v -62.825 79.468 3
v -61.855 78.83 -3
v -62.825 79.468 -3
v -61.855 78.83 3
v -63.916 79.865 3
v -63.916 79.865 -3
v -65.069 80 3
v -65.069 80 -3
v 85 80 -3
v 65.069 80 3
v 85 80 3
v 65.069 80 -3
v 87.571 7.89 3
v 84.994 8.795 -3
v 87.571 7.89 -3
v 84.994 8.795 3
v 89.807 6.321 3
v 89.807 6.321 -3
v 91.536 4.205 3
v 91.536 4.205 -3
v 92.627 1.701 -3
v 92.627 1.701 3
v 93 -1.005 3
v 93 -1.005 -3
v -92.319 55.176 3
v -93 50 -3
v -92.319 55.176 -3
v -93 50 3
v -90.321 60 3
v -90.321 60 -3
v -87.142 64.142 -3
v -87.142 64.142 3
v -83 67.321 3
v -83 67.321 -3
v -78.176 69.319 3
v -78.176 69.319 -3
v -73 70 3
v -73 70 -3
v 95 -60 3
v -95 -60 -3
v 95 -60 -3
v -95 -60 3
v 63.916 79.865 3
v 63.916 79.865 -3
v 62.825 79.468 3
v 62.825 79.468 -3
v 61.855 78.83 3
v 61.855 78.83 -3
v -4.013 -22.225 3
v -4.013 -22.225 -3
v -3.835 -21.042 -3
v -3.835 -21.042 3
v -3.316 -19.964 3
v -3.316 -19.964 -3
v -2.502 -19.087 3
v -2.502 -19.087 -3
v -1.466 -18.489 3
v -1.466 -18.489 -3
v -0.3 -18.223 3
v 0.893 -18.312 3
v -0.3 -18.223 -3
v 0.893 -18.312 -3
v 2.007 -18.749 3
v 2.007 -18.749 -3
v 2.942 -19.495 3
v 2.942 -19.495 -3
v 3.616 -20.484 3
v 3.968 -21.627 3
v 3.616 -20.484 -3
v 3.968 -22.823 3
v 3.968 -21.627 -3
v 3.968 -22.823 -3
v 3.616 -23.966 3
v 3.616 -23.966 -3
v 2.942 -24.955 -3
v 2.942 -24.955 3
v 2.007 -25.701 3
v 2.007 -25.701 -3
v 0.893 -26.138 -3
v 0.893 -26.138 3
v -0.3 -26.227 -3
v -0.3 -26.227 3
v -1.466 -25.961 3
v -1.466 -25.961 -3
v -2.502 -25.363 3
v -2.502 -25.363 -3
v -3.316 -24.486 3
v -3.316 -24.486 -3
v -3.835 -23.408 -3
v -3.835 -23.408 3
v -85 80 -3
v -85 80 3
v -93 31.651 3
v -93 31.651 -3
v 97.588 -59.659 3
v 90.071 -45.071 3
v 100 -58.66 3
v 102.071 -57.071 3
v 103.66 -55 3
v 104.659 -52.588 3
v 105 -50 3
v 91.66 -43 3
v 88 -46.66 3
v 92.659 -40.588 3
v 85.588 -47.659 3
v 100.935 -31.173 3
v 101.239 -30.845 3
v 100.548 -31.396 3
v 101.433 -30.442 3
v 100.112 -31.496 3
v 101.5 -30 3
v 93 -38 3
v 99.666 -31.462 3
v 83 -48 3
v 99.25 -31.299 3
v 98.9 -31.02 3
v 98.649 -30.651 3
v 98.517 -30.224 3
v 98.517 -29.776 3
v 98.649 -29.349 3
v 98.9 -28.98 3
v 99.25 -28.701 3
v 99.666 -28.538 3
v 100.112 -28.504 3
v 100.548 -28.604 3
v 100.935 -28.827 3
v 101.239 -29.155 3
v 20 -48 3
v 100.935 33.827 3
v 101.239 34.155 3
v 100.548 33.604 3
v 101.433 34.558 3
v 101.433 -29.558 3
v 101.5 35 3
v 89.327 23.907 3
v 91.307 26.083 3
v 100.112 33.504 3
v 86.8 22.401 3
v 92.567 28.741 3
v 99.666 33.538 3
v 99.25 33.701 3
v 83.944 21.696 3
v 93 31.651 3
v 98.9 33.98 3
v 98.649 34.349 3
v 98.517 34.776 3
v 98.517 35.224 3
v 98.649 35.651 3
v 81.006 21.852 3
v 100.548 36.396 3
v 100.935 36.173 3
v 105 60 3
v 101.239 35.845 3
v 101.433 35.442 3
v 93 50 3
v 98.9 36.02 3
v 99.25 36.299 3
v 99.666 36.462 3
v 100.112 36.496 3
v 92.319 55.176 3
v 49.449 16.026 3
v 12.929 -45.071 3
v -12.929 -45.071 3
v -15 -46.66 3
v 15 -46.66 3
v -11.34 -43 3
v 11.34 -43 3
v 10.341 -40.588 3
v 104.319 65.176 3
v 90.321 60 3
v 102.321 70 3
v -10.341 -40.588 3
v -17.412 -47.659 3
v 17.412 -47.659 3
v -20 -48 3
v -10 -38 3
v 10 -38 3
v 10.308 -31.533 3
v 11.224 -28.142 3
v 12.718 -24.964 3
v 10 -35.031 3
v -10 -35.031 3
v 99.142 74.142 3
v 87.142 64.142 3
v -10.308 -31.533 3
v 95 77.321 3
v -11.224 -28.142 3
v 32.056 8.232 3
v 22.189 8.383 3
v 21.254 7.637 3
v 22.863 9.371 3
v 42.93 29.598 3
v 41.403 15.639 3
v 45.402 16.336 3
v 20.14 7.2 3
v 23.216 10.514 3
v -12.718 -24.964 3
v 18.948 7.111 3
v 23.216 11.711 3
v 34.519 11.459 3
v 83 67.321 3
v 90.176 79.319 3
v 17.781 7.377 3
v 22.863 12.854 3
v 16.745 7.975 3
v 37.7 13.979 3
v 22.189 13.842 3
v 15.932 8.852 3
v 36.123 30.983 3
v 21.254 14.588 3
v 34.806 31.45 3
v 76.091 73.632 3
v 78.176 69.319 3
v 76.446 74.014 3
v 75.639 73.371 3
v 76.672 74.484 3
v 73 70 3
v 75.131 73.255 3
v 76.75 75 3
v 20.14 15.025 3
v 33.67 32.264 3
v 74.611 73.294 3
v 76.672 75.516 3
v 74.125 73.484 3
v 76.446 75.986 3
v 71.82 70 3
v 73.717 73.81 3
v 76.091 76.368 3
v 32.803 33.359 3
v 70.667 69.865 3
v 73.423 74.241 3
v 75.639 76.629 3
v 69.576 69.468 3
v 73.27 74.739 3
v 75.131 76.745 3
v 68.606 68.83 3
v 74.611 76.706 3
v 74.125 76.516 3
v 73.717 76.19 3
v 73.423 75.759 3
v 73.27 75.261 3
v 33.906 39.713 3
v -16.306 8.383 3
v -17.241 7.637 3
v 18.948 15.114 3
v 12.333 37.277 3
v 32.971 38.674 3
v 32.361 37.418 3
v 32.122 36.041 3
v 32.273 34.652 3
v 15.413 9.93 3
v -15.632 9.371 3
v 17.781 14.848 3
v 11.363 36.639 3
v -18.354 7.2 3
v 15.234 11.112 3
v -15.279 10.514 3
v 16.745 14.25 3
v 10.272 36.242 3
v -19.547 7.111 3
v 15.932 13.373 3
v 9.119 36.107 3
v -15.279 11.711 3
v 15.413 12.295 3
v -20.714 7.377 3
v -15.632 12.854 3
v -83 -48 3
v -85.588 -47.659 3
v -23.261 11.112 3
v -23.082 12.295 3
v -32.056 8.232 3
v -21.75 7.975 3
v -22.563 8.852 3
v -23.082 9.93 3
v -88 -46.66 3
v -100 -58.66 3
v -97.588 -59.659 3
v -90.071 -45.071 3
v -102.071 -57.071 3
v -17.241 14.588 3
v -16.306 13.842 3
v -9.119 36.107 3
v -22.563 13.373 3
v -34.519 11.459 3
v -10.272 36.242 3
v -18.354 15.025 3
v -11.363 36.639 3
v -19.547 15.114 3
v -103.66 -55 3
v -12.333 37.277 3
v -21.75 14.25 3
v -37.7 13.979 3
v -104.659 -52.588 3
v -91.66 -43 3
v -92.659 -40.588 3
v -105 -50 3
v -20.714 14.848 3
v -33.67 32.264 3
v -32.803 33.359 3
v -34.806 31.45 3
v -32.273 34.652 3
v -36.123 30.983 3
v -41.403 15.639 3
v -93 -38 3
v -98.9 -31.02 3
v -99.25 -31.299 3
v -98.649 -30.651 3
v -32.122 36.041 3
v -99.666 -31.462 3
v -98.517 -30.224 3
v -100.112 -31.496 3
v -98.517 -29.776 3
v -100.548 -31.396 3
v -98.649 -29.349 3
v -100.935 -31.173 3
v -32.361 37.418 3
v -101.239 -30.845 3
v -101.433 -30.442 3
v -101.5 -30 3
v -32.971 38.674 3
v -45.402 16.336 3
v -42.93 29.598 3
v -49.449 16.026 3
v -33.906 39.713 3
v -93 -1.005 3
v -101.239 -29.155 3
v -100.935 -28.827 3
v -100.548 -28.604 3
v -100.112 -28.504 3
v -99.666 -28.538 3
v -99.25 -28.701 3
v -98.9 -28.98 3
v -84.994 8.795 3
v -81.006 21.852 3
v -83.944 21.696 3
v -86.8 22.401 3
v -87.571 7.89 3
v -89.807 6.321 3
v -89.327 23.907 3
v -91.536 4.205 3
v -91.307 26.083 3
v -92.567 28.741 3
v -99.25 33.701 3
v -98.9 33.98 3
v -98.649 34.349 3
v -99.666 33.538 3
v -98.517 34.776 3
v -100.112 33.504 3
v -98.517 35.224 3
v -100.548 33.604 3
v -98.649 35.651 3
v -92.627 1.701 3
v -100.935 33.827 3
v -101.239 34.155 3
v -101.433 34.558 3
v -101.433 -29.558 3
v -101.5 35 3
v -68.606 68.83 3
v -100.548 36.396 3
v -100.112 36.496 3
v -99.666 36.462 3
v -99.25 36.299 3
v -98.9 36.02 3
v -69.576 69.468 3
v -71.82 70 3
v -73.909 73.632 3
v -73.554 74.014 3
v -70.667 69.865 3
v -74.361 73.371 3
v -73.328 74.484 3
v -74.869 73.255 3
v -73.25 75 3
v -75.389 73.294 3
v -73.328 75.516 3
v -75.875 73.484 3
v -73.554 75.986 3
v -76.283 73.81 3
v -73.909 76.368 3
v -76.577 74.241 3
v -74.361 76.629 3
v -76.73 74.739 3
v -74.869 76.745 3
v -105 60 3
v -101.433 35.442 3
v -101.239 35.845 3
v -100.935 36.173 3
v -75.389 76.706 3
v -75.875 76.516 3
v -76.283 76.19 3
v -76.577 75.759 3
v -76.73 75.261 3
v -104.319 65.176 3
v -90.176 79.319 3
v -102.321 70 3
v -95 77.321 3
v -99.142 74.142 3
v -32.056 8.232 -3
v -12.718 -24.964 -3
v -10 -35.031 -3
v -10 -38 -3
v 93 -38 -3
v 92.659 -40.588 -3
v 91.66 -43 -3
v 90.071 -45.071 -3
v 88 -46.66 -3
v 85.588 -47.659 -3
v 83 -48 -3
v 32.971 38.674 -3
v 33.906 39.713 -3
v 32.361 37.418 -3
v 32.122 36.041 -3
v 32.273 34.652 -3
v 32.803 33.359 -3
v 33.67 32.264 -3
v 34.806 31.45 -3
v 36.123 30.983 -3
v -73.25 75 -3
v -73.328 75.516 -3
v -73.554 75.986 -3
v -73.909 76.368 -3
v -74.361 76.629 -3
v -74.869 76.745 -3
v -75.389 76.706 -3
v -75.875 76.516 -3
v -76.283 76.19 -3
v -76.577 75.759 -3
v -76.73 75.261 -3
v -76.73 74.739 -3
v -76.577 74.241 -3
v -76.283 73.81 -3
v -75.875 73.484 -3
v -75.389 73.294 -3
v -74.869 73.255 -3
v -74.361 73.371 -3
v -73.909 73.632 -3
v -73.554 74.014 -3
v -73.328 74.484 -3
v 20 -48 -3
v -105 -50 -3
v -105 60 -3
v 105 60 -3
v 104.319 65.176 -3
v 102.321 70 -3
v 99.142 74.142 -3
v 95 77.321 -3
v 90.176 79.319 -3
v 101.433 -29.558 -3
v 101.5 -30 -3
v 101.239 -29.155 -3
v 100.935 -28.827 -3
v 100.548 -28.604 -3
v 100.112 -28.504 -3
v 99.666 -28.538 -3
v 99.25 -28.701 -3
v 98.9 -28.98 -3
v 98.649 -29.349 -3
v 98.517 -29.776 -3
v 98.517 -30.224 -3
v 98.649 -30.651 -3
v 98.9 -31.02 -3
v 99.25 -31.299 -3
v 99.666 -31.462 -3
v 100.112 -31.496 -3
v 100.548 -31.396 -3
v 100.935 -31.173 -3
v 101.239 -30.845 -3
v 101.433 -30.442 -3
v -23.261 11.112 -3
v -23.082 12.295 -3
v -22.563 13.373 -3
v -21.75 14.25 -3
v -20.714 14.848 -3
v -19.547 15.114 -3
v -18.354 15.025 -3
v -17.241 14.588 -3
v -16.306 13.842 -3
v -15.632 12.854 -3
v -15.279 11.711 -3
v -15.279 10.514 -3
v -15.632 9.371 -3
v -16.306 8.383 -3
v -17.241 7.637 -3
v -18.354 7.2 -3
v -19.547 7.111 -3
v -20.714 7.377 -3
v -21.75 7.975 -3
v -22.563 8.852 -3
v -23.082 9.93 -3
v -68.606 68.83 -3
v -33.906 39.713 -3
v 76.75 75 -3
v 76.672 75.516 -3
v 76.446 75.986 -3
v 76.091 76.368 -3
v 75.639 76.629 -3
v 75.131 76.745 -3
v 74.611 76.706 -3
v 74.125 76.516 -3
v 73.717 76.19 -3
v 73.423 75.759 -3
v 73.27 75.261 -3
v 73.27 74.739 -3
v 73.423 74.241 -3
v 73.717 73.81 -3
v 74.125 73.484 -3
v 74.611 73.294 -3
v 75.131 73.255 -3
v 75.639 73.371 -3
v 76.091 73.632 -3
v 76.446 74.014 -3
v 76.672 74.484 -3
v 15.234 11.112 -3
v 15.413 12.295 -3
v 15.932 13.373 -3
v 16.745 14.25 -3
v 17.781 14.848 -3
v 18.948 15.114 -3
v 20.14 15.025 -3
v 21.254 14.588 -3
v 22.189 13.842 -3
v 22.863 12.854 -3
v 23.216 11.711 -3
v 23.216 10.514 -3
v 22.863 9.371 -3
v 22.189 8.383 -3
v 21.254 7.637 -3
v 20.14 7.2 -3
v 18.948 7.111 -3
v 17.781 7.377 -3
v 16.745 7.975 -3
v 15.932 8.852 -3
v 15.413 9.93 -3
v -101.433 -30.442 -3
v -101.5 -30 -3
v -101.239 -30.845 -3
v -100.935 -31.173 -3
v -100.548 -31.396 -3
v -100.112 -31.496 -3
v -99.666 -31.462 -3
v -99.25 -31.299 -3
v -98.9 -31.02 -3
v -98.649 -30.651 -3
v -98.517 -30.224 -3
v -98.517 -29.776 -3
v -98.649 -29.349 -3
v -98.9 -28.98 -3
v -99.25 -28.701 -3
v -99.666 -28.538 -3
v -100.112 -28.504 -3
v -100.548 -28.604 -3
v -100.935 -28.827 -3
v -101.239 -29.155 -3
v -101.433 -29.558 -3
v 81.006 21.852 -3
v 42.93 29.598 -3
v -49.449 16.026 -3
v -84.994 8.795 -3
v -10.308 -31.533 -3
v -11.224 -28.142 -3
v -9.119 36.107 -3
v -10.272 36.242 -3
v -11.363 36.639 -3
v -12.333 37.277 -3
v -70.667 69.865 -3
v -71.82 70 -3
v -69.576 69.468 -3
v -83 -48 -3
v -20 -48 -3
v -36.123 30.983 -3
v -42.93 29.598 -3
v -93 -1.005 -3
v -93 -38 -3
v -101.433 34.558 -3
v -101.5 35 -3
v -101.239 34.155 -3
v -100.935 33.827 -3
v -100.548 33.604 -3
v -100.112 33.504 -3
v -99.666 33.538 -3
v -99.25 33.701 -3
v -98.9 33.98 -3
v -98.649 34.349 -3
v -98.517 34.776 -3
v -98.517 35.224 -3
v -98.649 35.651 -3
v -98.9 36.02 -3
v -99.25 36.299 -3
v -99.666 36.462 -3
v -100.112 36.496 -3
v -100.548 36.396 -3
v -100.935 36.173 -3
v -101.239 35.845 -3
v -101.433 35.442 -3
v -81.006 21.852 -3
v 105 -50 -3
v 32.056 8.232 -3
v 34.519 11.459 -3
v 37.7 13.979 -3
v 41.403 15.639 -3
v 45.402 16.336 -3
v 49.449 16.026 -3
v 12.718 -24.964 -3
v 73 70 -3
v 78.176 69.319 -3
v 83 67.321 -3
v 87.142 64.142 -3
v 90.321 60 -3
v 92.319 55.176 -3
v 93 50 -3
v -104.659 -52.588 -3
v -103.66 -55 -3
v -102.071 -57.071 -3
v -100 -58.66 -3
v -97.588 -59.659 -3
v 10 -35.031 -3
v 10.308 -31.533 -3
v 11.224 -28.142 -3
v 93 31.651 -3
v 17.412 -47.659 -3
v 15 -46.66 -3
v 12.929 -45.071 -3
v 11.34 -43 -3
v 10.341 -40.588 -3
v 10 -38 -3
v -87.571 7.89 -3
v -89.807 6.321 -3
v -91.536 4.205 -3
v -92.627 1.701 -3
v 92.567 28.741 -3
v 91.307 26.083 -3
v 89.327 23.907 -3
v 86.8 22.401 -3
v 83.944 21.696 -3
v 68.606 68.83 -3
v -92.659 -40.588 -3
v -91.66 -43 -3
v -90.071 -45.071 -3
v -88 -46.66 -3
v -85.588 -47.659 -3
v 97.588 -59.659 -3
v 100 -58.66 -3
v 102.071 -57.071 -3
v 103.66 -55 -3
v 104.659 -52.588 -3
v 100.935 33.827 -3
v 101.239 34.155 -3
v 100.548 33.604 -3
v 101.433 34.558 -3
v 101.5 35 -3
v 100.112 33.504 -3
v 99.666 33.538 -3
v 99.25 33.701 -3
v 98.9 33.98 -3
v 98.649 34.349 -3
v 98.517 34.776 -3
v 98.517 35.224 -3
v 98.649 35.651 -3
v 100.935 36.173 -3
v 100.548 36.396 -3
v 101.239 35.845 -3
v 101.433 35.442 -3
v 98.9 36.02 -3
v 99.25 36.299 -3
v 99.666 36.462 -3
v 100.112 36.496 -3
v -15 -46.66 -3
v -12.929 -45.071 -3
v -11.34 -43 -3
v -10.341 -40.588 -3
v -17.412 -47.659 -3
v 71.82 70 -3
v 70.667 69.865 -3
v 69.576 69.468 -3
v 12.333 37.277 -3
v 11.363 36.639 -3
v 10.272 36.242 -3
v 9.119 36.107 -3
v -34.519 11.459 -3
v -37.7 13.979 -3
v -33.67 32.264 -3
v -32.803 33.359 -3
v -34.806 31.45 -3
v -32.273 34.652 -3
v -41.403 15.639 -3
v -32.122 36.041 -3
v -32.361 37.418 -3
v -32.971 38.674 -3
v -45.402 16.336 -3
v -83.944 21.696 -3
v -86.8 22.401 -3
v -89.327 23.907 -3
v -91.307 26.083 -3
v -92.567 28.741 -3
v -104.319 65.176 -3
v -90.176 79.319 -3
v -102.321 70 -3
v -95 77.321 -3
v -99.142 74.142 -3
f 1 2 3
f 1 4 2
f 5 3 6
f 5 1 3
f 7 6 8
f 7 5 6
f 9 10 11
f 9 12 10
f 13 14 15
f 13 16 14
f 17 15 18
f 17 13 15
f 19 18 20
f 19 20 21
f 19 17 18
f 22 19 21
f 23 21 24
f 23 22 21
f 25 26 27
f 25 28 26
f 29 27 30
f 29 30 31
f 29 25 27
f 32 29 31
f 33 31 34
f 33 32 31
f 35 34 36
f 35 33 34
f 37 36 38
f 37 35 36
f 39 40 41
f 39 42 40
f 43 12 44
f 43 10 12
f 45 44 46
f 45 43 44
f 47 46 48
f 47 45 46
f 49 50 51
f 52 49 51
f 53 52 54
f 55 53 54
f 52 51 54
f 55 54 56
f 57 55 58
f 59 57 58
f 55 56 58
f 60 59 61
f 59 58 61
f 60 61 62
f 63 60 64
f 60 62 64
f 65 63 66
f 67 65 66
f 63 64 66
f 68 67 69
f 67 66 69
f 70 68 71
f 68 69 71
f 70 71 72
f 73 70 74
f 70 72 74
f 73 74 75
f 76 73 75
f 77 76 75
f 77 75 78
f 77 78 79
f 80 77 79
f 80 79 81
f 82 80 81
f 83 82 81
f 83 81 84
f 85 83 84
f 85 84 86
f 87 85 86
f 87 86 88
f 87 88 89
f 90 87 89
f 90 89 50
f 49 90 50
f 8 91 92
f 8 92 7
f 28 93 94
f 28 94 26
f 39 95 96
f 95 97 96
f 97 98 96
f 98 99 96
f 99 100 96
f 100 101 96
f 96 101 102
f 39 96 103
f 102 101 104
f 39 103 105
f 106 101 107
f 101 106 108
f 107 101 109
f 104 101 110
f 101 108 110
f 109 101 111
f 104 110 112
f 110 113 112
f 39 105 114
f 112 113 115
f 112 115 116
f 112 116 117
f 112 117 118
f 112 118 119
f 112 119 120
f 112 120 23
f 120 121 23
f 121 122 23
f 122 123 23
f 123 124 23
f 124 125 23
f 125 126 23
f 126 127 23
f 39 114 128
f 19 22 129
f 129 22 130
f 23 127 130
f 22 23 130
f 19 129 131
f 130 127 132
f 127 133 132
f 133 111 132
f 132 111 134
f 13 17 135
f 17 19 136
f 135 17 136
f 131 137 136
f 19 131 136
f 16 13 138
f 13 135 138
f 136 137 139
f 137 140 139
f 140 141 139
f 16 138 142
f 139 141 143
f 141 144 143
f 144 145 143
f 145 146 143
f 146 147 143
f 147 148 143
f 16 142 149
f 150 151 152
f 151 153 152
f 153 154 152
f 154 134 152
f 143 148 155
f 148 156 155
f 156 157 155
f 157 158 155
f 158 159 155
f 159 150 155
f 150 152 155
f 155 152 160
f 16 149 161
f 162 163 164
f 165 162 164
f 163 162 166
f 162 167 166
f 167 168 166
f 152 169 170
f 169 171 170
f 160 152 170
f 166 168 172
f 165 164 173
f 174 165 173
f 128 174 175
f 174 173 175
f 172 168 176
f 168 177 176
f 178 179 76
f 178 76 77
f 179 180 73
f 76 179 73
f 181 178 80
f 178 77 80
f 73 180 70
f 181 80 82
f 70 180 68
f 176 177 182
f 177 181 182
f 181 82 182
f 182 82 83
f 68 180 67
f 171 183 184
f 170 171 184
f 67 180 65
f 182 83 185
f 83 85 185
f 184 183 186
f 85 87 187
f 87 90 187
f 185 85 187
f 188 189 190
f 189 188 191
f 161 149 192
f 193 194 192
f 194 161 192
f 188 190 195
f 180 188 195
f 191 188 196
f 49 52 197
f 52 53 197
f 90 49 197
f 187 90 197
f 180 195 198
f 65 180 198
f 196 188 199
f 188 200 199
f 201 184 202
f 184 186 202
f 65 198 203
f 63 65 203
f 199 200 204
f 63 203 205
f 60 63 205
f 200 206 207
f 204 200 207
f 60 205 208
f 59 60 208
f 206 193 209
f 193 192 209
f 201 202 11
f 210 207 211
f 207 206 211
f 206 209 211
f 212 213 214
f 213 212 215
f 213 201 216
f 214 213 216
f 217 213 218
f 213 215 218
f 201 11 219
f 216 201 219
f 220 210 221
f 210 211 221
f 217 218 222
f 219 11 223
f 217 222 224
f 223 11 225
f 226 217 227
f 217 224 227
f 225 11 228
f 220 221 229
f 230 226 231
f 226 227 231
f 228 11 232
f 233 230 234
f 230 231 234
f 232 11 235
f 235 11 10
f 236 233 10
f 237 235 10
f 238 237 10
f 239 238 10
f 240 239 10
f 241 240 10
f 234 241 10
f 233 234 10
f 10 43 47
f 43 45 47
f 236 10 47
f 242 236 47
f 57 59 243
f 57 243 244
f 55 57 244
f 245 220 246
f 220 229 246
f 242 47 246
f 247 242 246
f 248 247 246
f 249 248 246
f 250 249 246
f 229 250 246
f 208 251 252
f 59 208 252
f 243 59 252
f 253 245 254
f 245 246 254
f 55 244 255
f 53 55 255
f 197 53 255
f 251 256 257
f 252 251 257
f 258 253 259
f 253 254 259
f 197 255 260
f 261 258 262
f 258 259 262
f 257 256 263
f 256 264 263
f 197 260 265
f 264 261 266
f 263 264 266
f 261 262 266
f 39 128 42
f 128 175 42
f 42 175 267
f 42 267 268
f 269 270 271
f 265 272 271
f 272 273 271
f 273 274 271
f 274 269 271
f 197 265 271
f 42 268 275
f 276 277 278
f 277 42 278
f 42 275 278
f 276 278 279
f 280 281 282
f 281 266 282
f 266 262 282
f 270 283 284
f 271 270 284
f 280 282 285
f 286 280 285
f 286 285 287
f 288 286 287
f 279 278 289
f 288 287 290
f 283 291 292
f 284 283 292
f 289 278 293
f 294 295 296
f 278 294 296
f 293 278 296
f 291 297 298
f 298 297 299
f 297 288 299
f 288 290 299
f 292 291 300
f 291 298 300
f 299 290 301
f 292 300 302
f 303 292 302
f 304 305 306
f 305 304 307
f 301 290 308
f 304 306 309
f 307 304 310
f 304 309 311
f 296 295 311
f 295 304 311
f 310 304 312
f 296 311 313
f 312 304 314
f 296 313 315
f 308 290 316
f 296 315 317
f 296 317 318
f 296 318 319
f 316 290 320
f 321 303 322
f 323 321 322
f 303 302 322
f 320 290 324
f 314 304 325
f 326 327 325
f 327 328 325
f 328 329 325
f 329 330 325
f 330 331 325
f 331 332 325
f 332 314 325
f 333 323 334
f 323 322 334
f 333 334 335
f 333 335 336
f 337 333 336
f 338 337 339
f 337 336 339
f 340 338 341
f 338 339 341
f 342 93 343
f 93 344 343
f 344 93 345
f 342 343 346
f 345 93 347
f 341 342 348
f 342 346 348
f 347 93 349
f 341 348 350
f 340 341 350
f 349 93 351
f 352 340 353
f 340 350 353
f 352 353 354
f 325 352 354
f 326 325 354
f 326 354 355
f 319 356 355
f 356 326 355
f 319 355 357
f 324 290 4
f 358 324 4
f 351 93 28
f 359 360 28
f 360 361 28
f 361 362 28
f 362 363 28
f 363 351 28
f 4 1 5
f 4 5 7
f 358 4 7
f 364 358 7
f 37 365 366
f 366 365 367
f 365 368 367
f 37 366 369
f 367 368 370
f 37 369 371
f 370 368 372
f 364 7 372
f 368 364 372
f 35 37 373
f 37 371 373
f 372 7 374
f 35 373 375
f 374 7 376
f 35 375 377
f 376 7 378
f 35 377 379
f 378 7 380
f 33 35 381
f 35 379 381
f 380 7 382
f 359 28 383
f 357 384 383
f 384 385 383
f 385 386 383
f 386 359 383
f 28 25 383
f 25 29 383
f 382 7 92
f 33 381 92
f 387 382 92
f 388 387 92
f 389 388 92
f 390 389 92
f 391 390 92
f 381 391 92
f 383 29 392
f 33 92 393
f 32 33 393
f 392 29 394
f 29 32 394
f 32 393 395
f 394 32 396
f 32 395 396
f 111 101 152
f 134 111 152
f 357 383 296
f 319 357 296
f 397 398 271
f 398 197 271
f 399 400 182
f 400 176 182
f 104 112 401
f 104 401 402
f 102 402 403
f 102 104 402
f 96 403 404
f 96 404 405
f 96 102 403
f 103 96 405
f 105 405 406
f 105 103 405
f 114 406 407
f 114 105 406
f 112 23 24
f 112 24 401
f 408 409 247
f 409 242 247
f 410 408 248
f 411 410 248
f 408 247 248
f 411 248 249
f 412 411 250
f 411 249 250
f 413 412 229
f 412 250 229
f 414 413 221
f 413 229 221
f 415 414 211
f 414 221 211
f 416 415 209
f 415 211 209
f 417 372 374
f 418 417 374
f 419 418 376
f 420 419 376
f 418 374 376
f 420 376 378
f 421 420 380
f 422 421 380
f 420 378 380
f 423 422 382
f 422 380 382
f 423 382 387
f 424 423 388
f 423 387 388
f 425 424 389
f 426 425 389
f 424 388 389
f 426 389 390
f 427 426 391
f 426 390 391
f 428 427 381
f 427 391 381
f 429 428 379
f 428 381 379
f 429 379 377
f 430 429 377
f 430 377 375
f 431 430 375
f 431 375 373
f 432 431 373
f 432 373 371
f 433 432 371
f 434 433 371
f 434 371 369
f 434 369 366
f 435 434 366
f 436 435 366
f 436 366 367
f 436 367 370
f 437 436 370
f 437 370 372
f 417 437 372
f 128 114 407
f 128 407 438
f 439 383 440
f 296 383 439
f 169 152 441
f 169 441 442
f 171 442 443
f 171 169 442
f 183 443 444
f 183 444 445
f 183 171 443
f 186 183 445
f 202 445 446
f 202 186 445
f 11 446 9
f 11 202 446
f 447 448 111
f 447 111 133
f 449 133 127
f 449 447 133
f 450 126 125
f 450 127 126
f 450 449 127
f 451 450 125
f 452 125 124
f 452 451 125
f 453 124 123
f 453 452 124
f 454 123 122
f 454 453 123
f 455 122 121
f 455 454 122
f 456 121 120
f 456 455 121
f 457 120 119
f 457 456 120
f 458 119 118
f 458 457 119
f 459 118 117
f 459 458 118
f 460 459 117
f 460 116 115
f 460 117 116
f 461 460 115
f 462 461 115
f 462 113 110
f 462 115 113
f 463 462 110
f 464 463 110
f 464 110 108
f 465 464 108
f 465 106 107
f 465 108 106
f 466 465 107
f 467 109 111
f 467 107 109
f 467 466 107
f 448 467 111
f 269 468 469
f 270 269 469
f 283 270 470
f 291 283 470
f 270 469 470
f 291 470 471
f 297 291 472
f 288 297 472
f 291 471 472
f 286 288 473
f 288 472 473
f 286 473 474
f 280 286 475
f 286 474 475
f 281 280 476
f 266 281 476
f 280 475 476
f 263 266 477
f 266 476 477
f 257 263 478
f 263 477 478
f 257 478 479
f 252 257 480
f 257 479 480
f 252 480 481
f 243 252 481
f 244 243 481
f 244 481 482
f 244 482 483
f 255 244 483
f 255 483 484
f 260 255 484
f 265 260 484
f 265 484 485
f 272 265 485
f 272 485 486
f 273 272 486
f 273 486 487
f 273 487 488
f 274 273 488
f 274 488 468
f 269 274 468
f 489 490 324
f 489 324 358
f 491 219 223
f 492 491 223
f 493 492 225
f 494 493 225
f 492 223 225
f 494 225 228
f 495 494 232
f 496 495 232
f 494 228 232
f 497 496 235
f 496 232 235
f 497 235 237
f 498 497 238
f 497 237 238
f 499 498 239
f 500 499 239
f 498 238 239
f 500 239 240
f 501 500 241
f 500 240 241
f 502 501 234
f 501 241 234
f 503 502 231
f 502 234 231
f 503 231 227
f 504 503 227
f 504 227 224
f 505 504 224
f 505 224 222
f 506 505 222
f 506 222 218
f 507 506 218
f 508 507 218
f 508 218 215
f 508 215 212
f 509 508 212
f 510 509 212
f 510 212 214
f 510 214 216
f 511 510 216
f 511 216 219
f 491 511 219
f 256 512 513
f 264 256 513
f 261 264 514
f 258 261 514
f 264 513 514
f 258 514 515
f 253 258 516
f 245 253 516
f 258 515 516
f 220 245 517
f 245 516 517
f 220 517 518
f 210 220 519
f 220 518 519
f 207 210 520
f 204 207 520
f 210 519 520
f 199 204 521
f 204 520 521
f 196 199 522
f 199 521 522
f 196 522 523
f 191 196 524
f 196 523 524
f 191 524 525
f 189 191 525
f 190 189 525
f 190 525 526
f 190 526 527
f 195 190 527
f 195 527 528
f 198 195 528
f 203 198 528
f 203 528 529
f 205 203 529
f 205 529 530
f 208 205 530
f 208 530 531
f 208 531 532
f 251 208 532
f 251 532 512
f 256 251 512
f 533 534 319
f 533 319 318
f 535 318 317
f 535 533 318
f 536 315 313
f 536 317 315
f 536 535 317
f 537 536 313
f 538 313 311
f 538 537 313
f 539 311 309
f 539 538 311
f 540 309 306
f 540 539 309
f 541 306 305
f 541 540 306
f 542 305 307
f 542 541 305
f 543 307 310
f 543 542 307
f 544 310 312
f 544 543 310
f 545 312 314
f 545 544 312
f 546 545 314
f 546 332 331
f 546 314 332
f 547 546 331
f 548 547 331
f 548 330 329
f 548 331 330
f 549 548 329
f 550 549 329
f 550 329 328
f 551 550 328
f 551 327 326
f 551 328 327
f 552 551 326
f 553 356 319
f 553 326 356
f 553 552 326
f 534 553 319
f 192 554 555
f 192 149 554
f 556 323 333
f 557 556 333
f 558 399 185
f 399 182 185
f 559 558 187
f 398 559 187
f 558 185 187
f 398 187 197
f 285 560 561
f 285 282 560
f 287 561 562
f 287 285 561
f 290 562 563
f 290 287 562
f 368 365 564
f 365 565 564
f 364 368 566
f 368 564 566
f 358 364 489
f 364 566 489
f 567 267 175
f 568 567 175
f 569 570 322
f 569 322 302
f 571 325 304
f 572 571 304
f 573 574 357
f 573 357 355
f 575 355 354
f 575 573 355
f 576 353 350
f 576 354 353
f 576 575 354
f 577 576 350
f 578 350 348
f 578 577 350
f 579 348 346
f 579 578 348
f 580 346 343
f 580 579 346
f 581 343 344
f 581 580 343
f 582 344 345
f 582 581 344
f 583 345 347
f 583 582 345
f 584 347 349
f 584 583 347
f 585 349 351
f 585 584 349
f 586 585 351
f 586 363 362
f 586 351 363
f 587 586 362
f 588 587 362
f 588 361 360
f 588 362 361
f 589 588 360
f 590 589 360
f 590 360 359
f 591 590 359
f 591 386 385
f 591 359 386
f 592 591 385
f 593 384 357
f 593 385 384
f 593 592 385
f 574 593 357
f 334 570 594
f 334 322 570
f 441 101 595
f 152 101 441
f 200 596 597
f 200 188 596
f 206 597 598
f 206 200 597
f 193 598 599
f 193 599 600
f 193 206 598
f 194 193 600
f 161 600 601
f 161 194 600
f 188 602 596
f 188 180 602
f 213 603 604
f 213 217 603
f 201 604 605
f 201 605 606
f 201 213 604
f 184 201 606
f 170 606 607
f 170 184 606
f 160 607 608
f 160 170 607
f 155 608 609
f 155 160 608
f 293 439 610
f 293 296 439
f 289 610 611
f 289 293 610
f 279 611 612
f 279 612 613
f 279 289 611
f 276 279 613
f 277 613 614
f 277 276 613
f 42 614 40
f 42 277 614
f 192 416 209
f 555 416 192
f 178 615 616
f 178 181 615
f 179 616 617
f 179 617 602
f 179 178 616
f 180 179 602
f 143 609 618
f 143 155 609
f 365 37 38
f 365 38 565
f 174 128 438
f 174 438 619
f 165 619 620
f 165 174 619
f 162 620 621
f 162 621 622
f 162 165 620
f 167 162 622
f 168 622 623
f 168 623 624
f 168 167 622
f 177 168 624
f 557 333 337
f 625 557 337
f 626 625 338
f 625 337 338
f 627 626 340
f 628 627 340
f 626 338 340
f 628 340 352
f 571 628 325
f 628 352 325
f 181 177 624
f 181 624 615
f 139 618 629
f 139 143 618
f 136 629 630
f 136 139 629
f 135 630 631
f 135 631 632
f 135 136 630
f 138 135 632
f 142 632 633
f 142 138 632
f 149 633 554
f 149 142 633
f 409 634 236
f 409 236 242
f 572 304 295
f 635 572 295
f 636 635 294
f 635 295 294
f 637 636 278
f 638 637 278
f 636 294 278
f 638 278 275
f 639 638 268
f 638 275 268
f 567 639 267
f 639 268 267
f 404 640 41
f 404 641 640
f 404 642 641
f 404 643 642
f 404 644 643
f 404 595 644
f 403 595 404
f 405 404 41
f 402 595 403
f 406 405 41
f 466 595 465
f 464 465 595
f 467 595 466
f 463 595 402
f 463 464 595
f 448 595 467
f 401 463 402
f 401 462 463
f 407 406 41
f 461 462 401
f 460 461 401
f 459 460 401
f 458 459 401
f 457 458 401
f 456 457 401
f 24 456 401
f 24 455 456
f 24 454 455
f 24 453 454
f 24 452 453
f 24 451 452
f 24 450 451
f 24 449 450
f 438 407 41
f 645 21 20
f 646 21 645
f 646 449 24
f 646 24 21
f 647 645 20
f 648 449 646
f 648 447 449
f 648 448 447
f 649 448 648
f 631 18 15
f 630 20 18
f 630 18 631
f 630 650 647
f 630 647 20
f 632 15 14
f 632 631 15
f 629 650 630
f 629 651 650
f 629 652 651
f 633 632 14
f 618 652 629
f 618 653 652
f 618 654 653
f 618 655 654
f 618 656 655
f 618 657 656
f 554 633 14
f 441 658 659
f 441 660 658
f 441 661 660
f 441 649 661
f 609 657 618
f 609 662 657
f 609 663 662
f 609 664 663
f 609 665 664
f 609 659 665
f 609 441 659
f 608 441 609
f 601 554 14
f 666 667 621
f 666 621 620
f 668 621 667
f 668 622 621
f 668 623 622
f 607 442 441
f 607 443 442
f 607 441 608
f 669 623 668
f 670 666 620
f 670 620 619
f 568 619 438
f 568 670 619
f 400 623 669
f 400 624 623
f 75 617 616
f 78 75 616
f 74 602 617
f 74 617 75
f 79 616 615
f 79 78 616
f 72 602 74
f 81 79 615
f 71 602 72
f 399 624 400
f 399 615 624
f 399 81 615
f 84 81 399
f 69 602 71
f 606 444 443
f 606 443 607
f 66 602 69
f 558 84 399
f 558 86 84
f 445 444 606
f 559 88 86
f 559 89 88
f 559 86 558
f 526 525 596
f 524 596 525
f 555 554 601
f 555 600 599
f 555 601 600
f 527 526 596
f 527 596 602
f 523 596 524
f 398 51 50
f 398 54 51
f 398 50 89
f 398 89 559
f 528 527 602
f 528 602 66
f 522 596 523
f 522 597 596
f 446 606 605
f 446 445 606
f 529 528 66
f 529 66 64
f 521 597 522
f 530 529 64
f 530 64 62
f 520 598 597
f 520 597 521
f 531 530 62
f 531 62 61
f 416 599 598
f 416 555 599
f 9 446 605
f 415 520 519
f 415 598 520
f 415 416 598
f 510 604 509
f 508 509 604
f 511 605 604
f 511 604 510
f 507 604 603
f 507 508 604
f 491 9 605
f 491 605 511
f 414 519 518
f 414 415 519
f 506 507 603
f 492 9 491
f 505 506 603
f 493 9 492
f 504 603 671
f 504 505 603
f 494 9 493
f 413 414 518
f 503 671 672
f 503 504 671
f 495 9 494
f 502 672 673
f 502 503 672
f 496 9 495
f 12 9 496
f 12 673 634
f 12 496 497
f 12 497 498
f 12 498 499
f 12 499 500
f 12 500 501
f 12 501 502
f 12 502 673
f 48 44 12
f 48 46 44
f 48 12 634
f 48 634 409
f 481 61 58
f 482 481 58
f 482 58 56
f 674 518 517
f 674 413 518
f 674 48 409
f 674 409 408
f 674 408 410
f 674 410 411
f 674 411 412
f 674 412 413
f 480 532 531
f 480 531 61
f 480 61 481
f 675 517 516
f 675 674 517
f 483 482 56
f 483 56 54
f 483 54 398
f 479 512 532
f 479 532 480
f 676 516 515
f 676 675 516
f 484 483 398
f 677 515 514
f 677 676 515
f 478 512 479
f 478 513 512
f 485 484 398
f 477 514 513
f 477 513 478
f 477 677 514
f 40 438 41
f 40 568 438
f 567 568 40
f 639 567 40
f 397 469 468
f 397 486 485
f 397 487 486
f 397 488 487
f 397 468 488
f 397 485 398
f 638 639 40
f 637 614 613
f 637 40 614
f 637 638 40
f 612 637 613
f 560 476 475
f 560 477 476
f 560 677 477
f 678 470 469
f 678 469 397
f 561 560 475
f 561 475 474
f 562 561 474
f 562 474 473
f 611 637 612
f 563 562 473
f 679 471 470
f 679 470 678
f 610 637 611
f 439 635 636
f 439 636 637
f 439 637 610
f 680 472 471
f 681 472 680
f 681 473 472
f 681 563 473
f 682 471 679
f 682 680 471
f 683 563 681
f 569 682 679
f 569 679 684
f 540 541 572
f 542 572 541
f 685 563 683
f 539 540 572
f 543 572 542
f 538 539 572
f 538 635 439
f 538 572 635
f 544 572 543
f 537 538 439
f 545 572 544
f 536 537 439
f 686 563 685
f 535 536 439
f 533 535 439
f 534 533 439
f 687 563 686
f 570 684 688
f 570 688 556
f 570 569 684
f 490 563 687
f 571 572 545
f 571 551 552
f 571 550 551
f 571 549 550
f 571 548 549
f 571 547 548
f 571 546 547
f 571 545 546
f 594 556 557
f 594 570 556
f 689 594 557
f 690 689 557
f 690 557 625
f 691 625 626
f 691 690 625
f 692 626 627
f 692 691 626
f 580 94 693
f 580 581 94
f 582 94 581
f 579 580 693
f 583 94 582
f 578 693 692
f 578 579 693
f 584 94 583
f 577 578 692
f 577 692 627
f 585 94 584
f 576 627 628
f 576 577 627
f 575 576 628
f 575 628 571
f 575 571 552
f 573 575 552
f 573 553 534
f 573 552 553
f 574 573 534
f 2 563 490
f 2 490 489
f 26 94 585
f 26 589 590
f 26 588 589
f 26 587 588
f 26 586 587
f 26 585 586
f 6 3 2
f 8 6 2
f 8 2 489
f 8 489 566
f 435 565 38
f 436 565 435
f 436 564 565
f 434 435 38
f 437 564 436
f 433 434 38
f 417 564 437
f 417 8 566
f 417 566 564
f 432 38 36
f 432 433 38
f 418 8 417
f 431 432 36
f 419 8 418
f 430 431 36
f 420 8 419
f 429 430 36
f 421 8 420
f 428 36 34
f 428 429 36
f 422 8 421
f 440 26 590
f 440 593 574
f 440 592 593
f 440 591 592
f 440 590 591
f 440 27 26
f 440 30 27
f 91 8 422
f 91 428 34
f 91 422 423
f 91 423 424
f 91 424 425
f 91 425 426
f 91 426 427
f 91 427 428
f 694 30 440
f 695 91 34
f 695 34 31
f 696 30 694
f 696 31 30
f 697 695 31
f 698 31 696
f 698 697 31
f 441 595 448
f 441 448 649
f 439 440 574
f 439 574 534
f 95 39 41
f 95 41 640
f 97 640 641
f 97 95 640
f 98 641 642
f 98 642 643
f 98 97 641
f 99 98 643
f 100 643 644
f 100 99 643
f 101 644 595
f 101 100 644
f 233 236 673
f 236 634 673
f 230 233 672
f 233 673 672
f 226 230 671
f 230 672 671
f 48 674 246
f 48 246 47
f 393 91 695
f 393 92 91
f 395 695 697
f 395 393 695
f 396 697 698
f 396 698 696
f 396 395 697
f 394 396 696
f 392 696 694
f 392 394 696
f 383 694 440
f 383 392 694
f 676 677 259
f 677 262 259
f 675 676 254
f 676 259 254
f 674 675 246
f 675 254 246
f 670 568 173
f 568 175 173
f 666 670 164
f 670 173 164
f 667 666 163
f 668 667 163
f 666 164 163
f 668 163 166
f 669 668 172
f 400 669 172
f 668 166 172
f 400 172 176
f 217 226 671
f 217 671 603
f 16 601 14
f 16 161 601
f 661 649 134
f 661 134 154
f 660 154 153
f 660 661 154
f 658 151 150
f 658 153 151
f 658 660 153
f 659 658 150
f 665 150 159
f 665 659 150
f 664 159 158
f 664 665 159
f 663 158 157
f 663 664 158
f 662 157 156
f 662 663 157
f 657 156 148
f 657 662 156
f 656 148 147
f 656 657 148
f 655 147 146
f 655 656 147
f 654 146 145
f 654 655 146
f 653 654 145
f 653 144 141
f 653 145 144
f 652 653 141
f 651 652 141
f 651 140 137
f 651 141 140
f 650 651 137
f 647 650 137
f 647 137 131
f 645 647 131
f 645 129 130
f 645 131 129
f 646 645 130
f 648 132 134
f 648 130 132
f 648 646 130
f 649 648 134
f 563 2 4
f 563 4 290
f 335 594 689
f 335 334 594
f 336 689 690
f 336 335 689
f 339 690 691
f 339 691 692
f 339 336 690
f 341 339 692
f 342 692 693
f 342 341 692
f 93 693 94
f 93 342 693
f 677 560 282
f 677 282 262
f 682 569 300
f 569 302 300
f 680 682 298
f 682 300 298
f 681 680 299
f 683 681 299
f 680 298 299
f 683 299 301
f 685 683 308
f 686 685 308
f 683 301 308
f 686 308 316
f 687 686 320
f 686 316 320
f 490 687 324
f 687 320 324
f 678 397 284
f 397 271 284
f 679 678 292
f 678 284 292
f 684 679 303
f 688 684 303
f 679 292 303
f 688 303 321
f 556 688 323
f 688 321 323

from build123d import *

# Parameters (mm, degrees)
BOSS_EXTRUDE1_DEPTH          = 3
CUT_EXTRUDE1_DEPTH           = 133.140077191
CUT_EXTRUDE1_DEPTH_BACK      = 133.140077191
SKETCH2_R                    = 1.5
O_0_316_DIAMETER_HOLE1_D     = 8.0264
O_0_316_DIAMETER_HOLE1_DEPTH = 10
O_0_316_DIAMETER_HOLE1_TIP   = 2.411373836
SKETCH6_W                    = 140
SKETCH6_H                    = 10
CUT_EXTRUDE2_DEPTH           = 10
SKETCH7_R                    = 1.75
CUT_EXTRUDE3_DEPTH           = 10
BOSS_EXTRUDE3_DEPTH          = 6
FILLET2_R                    = 5


with BuildPart() as part:
    # Sketch1 → Boss-Extrude1 (new, symmetric)
    with BuildSketch(Plane.XY):
        with BuildLine():
            Line((-95, -60), (95, -60))
            ThreePointArc((95, -60), (102.071067812, -57.071067812), (105, -50))
            Line((105, -50), (105, 60))
            ThreePointArc((105, 60), (99.142135624, 74.142135624), (85, 80))
            Line((85, 80), (-85, 80))
            ThreePointArc((-85, 80), (-99.142135624, 74.142135624), (-105, 60))
            Line((-105, 60), (-105, -50))
            ThreePointArc((-105, -50), (-102.071067812, -57.071067812), (-95, -60))
        make_face()
        with BuildLine():
            Line((93, -1.00460734), (93, -38))
            ThreePointArc((93, -38), (90.071067812, -45.071067812), (83, -48))
            Line((83, -48), (20, -48))
            ThreePointArc((20, -48), (12.928932188, -45.071067812), (10, -38))
            Line((10, -38), (10, -35.031250653))
            ThreePointArc((10, -35.031250653), (10.691550782, -29.817443139), (12.71837888, -24.964196891))
            Line((12.71837888, -24.964196891), (32.056244976, 8.232176449))
            ThreePointArc((32.056244976, 8.232176449), (39.499751599, 14.924573129), (49.448622011, 16.026363354))
            Line((49.448622011, 16.026363354), (84.993679344, 8.794639706))
            ThreePointArc((84.993679344, 8.794639706), (90.743926441, 5.322445946), (93, -1.00460734))
        make_face(mode=Mode.SUBTRACT)
        with BuildLine():
            Line((-83, -48), (-20, -48))
            ThreePointArc((-20, -48), (-12.928932188, -45.071067812), (-10, -38))
            Line((-10, -38), (-10, -35.031250653))
            ThreePointArc((-10, -35.031250653), (-10.691550782, -29.817443139), (-12.71837888, -24.964196891))
            Line((-12.71837888, -24.964196891), (-32.056244976, 8.232176449))
            ThreePointArc((-32.056244976, 8.232176449), (-39.499751599, 14.924573129), (-49.448622011, 16.026363354))
            Line((-49.448622011, 16.026363354), (-84.993679344, 8.794639706))
            ThreePointArc((-84.993679344, 8.794639706), (-90.743926441, 5.322445946), (-93, -1.00460734))
            Line((-93, -1.00460734), (-93, -38))
            ThreePointArc((-93, -38), (-90.071067812, -45.071067812), (-83, -48))
        make_face(mode=Mode.SUBTRACT)
        with BuildLine():
            Line((-93, 31.650962878), (-93, 50))
            ThreePointArc((-93, 50), (-87.142135624, 64.142135624), (-73, 70))
            Line((-73, 70), (73, 70))
            ThreePointArc((73, 70), (87.142135624, 64.142135624), (93, 50))
            Line((93, 50), (93, 31.650962878))
            ThreePointArc((93, 31.650962878), (89.327053286, 23.907036437), (81.006320656, 21.851715832))
            Line((81.006320656, 21.851715832), (42.92968902, 29.598494092))
            ThreePointArc((42.92968902, 29.598494092), (40.946091564, 29.899370365), (38.942330332, 30))
            Line((38.942330332, 30), (-38.942330332, 30))
            ThreePointArc((-38.942330332, 30), (-40.946091564, 29.899370365), (-42.92968902, 29.598494092))
            Line((-42.92968902, 29.598494092), (-81.006320656, 21.851715832))
            ThreePointArc((-81.006320656, 21.851715832), (-89.327053286, 23.907036437), (-93, 31.650962878))
        make_face(mode=Mode.SUBTRACT)
    extrude(amount=BOSS_EXTRUDE1_DEPTH, both=True)

    # Sketch2 → Cut-Extrude1 (cut, two sides: drawn at the far end of the back side and taken through both)
    with BuildSketch(Plane.XY.offset(3).offset(-CUT_EXTRUDE1_DEPTH_BACK)):
        with Locations((100, 35)):
            Circle(SKETCH2_R)
        with Locations((100, -30)):
            Circle(SKETCH2_R)
        with Locations(Location((-100, -30, 0), (0, 0, 180))):
            Circle(SKETCH2_R)
        with Locations(Location((-100, 35, 0), (0, 0, 180))):
            Circle(SKETCH2_R)
    extrude(amount=CUT_EXTRUDE1_DEPTH + CUT_EXTRUDE1_DEPTH_BACK, mode=Mode.SUBTRACT)

    # O (0.316) Diameter Hole1
    with Locations(Plane.XY.offset(3)):
        with Locations((-19.247414599, 11.1125), (19.247414599, 11.1125), (0, -22.225)):
            Hole(O_0_316_DIAMETER_HOLE1_D / 2, depth=O_0_316_DIAMETER_HOLE1_DEPTH)
            with Locations((0, 0, -(O_0_316_DIAMETER_HOLE1_DEPTH + O_0_316_DIAMETER_HOLE1_TIP / 2))):  # 118° drill point
                Cone(0, O_0_316_DIAMETER_HOLE1_D / 2, O_0_316_DIAMETER_HOLE1_TIP, mode=Mode.SUBTRACT)

    # Sketch6 → Cut-Extrude2 (cut)
    with BuildSketch(Plane.XY.offset(3)):
        with Locations((0, 75)):
            Rectangle(SKETCH6_W, SKETCH6_H)
    extrude(amount=-CUT_EXTRUDE2_DEPTH, mode=Mode.SUBTRACT)

    # Sketch7 → Cut-Extrude3 (cut)
    with BuildSketch(Plane.XY.offset(3)):
        with Locations((-75, 75)):
            Circle(SKETCH7_R)
        with Locations((75, 75)):
            Circle(SKETCH7_R)
    extrude(amount=-CUT_EXTRUDE3_DEPTH, mode=Mode.SUBTRACT)

    # Sketch8 → Boss-Extrude3 (add)
    with BuildSketch(Plane(origin=(0, 0, -3), x_dir=(-1, 0, 0), z_dir=(0, 0, -1))):
        Polygon((-63.248850004, 80), (-70, 80), (-70, 70), (-25.96476149, 33.050047608), (-42.92968902, 29.598494092), (42.92968902, 29.598494092), (25.96476149, 33.050047608), (70, 70), (70, 80), (69.821528384, 80), (63.248850004, 80), (10.939239008, 36.107024707), (-10.939239008, 36.107024707), align=None)
    extrude(amount=-BOSS_EXTRUDE3_DEPTH)

    # Fillet2
    fillet2_edges = [part.edges().sort_by_distance(p)[0] for p in [
        (70, 70, 0),
        (-70, 70, 0),
        (25.96476149, 33.050047608, 0),
        (63.248850004, 80, 0),
        (10.939239008, 36.107024707, 0),
        (-10.939239008, 36.107024707, 0),
        (-63.248850004, 80, 0),
        (-25.96476149, 33.050047608, 0),
    ]]
    fillet(fillet2_edges, radius=FILLET2_R)


solid = part.part
